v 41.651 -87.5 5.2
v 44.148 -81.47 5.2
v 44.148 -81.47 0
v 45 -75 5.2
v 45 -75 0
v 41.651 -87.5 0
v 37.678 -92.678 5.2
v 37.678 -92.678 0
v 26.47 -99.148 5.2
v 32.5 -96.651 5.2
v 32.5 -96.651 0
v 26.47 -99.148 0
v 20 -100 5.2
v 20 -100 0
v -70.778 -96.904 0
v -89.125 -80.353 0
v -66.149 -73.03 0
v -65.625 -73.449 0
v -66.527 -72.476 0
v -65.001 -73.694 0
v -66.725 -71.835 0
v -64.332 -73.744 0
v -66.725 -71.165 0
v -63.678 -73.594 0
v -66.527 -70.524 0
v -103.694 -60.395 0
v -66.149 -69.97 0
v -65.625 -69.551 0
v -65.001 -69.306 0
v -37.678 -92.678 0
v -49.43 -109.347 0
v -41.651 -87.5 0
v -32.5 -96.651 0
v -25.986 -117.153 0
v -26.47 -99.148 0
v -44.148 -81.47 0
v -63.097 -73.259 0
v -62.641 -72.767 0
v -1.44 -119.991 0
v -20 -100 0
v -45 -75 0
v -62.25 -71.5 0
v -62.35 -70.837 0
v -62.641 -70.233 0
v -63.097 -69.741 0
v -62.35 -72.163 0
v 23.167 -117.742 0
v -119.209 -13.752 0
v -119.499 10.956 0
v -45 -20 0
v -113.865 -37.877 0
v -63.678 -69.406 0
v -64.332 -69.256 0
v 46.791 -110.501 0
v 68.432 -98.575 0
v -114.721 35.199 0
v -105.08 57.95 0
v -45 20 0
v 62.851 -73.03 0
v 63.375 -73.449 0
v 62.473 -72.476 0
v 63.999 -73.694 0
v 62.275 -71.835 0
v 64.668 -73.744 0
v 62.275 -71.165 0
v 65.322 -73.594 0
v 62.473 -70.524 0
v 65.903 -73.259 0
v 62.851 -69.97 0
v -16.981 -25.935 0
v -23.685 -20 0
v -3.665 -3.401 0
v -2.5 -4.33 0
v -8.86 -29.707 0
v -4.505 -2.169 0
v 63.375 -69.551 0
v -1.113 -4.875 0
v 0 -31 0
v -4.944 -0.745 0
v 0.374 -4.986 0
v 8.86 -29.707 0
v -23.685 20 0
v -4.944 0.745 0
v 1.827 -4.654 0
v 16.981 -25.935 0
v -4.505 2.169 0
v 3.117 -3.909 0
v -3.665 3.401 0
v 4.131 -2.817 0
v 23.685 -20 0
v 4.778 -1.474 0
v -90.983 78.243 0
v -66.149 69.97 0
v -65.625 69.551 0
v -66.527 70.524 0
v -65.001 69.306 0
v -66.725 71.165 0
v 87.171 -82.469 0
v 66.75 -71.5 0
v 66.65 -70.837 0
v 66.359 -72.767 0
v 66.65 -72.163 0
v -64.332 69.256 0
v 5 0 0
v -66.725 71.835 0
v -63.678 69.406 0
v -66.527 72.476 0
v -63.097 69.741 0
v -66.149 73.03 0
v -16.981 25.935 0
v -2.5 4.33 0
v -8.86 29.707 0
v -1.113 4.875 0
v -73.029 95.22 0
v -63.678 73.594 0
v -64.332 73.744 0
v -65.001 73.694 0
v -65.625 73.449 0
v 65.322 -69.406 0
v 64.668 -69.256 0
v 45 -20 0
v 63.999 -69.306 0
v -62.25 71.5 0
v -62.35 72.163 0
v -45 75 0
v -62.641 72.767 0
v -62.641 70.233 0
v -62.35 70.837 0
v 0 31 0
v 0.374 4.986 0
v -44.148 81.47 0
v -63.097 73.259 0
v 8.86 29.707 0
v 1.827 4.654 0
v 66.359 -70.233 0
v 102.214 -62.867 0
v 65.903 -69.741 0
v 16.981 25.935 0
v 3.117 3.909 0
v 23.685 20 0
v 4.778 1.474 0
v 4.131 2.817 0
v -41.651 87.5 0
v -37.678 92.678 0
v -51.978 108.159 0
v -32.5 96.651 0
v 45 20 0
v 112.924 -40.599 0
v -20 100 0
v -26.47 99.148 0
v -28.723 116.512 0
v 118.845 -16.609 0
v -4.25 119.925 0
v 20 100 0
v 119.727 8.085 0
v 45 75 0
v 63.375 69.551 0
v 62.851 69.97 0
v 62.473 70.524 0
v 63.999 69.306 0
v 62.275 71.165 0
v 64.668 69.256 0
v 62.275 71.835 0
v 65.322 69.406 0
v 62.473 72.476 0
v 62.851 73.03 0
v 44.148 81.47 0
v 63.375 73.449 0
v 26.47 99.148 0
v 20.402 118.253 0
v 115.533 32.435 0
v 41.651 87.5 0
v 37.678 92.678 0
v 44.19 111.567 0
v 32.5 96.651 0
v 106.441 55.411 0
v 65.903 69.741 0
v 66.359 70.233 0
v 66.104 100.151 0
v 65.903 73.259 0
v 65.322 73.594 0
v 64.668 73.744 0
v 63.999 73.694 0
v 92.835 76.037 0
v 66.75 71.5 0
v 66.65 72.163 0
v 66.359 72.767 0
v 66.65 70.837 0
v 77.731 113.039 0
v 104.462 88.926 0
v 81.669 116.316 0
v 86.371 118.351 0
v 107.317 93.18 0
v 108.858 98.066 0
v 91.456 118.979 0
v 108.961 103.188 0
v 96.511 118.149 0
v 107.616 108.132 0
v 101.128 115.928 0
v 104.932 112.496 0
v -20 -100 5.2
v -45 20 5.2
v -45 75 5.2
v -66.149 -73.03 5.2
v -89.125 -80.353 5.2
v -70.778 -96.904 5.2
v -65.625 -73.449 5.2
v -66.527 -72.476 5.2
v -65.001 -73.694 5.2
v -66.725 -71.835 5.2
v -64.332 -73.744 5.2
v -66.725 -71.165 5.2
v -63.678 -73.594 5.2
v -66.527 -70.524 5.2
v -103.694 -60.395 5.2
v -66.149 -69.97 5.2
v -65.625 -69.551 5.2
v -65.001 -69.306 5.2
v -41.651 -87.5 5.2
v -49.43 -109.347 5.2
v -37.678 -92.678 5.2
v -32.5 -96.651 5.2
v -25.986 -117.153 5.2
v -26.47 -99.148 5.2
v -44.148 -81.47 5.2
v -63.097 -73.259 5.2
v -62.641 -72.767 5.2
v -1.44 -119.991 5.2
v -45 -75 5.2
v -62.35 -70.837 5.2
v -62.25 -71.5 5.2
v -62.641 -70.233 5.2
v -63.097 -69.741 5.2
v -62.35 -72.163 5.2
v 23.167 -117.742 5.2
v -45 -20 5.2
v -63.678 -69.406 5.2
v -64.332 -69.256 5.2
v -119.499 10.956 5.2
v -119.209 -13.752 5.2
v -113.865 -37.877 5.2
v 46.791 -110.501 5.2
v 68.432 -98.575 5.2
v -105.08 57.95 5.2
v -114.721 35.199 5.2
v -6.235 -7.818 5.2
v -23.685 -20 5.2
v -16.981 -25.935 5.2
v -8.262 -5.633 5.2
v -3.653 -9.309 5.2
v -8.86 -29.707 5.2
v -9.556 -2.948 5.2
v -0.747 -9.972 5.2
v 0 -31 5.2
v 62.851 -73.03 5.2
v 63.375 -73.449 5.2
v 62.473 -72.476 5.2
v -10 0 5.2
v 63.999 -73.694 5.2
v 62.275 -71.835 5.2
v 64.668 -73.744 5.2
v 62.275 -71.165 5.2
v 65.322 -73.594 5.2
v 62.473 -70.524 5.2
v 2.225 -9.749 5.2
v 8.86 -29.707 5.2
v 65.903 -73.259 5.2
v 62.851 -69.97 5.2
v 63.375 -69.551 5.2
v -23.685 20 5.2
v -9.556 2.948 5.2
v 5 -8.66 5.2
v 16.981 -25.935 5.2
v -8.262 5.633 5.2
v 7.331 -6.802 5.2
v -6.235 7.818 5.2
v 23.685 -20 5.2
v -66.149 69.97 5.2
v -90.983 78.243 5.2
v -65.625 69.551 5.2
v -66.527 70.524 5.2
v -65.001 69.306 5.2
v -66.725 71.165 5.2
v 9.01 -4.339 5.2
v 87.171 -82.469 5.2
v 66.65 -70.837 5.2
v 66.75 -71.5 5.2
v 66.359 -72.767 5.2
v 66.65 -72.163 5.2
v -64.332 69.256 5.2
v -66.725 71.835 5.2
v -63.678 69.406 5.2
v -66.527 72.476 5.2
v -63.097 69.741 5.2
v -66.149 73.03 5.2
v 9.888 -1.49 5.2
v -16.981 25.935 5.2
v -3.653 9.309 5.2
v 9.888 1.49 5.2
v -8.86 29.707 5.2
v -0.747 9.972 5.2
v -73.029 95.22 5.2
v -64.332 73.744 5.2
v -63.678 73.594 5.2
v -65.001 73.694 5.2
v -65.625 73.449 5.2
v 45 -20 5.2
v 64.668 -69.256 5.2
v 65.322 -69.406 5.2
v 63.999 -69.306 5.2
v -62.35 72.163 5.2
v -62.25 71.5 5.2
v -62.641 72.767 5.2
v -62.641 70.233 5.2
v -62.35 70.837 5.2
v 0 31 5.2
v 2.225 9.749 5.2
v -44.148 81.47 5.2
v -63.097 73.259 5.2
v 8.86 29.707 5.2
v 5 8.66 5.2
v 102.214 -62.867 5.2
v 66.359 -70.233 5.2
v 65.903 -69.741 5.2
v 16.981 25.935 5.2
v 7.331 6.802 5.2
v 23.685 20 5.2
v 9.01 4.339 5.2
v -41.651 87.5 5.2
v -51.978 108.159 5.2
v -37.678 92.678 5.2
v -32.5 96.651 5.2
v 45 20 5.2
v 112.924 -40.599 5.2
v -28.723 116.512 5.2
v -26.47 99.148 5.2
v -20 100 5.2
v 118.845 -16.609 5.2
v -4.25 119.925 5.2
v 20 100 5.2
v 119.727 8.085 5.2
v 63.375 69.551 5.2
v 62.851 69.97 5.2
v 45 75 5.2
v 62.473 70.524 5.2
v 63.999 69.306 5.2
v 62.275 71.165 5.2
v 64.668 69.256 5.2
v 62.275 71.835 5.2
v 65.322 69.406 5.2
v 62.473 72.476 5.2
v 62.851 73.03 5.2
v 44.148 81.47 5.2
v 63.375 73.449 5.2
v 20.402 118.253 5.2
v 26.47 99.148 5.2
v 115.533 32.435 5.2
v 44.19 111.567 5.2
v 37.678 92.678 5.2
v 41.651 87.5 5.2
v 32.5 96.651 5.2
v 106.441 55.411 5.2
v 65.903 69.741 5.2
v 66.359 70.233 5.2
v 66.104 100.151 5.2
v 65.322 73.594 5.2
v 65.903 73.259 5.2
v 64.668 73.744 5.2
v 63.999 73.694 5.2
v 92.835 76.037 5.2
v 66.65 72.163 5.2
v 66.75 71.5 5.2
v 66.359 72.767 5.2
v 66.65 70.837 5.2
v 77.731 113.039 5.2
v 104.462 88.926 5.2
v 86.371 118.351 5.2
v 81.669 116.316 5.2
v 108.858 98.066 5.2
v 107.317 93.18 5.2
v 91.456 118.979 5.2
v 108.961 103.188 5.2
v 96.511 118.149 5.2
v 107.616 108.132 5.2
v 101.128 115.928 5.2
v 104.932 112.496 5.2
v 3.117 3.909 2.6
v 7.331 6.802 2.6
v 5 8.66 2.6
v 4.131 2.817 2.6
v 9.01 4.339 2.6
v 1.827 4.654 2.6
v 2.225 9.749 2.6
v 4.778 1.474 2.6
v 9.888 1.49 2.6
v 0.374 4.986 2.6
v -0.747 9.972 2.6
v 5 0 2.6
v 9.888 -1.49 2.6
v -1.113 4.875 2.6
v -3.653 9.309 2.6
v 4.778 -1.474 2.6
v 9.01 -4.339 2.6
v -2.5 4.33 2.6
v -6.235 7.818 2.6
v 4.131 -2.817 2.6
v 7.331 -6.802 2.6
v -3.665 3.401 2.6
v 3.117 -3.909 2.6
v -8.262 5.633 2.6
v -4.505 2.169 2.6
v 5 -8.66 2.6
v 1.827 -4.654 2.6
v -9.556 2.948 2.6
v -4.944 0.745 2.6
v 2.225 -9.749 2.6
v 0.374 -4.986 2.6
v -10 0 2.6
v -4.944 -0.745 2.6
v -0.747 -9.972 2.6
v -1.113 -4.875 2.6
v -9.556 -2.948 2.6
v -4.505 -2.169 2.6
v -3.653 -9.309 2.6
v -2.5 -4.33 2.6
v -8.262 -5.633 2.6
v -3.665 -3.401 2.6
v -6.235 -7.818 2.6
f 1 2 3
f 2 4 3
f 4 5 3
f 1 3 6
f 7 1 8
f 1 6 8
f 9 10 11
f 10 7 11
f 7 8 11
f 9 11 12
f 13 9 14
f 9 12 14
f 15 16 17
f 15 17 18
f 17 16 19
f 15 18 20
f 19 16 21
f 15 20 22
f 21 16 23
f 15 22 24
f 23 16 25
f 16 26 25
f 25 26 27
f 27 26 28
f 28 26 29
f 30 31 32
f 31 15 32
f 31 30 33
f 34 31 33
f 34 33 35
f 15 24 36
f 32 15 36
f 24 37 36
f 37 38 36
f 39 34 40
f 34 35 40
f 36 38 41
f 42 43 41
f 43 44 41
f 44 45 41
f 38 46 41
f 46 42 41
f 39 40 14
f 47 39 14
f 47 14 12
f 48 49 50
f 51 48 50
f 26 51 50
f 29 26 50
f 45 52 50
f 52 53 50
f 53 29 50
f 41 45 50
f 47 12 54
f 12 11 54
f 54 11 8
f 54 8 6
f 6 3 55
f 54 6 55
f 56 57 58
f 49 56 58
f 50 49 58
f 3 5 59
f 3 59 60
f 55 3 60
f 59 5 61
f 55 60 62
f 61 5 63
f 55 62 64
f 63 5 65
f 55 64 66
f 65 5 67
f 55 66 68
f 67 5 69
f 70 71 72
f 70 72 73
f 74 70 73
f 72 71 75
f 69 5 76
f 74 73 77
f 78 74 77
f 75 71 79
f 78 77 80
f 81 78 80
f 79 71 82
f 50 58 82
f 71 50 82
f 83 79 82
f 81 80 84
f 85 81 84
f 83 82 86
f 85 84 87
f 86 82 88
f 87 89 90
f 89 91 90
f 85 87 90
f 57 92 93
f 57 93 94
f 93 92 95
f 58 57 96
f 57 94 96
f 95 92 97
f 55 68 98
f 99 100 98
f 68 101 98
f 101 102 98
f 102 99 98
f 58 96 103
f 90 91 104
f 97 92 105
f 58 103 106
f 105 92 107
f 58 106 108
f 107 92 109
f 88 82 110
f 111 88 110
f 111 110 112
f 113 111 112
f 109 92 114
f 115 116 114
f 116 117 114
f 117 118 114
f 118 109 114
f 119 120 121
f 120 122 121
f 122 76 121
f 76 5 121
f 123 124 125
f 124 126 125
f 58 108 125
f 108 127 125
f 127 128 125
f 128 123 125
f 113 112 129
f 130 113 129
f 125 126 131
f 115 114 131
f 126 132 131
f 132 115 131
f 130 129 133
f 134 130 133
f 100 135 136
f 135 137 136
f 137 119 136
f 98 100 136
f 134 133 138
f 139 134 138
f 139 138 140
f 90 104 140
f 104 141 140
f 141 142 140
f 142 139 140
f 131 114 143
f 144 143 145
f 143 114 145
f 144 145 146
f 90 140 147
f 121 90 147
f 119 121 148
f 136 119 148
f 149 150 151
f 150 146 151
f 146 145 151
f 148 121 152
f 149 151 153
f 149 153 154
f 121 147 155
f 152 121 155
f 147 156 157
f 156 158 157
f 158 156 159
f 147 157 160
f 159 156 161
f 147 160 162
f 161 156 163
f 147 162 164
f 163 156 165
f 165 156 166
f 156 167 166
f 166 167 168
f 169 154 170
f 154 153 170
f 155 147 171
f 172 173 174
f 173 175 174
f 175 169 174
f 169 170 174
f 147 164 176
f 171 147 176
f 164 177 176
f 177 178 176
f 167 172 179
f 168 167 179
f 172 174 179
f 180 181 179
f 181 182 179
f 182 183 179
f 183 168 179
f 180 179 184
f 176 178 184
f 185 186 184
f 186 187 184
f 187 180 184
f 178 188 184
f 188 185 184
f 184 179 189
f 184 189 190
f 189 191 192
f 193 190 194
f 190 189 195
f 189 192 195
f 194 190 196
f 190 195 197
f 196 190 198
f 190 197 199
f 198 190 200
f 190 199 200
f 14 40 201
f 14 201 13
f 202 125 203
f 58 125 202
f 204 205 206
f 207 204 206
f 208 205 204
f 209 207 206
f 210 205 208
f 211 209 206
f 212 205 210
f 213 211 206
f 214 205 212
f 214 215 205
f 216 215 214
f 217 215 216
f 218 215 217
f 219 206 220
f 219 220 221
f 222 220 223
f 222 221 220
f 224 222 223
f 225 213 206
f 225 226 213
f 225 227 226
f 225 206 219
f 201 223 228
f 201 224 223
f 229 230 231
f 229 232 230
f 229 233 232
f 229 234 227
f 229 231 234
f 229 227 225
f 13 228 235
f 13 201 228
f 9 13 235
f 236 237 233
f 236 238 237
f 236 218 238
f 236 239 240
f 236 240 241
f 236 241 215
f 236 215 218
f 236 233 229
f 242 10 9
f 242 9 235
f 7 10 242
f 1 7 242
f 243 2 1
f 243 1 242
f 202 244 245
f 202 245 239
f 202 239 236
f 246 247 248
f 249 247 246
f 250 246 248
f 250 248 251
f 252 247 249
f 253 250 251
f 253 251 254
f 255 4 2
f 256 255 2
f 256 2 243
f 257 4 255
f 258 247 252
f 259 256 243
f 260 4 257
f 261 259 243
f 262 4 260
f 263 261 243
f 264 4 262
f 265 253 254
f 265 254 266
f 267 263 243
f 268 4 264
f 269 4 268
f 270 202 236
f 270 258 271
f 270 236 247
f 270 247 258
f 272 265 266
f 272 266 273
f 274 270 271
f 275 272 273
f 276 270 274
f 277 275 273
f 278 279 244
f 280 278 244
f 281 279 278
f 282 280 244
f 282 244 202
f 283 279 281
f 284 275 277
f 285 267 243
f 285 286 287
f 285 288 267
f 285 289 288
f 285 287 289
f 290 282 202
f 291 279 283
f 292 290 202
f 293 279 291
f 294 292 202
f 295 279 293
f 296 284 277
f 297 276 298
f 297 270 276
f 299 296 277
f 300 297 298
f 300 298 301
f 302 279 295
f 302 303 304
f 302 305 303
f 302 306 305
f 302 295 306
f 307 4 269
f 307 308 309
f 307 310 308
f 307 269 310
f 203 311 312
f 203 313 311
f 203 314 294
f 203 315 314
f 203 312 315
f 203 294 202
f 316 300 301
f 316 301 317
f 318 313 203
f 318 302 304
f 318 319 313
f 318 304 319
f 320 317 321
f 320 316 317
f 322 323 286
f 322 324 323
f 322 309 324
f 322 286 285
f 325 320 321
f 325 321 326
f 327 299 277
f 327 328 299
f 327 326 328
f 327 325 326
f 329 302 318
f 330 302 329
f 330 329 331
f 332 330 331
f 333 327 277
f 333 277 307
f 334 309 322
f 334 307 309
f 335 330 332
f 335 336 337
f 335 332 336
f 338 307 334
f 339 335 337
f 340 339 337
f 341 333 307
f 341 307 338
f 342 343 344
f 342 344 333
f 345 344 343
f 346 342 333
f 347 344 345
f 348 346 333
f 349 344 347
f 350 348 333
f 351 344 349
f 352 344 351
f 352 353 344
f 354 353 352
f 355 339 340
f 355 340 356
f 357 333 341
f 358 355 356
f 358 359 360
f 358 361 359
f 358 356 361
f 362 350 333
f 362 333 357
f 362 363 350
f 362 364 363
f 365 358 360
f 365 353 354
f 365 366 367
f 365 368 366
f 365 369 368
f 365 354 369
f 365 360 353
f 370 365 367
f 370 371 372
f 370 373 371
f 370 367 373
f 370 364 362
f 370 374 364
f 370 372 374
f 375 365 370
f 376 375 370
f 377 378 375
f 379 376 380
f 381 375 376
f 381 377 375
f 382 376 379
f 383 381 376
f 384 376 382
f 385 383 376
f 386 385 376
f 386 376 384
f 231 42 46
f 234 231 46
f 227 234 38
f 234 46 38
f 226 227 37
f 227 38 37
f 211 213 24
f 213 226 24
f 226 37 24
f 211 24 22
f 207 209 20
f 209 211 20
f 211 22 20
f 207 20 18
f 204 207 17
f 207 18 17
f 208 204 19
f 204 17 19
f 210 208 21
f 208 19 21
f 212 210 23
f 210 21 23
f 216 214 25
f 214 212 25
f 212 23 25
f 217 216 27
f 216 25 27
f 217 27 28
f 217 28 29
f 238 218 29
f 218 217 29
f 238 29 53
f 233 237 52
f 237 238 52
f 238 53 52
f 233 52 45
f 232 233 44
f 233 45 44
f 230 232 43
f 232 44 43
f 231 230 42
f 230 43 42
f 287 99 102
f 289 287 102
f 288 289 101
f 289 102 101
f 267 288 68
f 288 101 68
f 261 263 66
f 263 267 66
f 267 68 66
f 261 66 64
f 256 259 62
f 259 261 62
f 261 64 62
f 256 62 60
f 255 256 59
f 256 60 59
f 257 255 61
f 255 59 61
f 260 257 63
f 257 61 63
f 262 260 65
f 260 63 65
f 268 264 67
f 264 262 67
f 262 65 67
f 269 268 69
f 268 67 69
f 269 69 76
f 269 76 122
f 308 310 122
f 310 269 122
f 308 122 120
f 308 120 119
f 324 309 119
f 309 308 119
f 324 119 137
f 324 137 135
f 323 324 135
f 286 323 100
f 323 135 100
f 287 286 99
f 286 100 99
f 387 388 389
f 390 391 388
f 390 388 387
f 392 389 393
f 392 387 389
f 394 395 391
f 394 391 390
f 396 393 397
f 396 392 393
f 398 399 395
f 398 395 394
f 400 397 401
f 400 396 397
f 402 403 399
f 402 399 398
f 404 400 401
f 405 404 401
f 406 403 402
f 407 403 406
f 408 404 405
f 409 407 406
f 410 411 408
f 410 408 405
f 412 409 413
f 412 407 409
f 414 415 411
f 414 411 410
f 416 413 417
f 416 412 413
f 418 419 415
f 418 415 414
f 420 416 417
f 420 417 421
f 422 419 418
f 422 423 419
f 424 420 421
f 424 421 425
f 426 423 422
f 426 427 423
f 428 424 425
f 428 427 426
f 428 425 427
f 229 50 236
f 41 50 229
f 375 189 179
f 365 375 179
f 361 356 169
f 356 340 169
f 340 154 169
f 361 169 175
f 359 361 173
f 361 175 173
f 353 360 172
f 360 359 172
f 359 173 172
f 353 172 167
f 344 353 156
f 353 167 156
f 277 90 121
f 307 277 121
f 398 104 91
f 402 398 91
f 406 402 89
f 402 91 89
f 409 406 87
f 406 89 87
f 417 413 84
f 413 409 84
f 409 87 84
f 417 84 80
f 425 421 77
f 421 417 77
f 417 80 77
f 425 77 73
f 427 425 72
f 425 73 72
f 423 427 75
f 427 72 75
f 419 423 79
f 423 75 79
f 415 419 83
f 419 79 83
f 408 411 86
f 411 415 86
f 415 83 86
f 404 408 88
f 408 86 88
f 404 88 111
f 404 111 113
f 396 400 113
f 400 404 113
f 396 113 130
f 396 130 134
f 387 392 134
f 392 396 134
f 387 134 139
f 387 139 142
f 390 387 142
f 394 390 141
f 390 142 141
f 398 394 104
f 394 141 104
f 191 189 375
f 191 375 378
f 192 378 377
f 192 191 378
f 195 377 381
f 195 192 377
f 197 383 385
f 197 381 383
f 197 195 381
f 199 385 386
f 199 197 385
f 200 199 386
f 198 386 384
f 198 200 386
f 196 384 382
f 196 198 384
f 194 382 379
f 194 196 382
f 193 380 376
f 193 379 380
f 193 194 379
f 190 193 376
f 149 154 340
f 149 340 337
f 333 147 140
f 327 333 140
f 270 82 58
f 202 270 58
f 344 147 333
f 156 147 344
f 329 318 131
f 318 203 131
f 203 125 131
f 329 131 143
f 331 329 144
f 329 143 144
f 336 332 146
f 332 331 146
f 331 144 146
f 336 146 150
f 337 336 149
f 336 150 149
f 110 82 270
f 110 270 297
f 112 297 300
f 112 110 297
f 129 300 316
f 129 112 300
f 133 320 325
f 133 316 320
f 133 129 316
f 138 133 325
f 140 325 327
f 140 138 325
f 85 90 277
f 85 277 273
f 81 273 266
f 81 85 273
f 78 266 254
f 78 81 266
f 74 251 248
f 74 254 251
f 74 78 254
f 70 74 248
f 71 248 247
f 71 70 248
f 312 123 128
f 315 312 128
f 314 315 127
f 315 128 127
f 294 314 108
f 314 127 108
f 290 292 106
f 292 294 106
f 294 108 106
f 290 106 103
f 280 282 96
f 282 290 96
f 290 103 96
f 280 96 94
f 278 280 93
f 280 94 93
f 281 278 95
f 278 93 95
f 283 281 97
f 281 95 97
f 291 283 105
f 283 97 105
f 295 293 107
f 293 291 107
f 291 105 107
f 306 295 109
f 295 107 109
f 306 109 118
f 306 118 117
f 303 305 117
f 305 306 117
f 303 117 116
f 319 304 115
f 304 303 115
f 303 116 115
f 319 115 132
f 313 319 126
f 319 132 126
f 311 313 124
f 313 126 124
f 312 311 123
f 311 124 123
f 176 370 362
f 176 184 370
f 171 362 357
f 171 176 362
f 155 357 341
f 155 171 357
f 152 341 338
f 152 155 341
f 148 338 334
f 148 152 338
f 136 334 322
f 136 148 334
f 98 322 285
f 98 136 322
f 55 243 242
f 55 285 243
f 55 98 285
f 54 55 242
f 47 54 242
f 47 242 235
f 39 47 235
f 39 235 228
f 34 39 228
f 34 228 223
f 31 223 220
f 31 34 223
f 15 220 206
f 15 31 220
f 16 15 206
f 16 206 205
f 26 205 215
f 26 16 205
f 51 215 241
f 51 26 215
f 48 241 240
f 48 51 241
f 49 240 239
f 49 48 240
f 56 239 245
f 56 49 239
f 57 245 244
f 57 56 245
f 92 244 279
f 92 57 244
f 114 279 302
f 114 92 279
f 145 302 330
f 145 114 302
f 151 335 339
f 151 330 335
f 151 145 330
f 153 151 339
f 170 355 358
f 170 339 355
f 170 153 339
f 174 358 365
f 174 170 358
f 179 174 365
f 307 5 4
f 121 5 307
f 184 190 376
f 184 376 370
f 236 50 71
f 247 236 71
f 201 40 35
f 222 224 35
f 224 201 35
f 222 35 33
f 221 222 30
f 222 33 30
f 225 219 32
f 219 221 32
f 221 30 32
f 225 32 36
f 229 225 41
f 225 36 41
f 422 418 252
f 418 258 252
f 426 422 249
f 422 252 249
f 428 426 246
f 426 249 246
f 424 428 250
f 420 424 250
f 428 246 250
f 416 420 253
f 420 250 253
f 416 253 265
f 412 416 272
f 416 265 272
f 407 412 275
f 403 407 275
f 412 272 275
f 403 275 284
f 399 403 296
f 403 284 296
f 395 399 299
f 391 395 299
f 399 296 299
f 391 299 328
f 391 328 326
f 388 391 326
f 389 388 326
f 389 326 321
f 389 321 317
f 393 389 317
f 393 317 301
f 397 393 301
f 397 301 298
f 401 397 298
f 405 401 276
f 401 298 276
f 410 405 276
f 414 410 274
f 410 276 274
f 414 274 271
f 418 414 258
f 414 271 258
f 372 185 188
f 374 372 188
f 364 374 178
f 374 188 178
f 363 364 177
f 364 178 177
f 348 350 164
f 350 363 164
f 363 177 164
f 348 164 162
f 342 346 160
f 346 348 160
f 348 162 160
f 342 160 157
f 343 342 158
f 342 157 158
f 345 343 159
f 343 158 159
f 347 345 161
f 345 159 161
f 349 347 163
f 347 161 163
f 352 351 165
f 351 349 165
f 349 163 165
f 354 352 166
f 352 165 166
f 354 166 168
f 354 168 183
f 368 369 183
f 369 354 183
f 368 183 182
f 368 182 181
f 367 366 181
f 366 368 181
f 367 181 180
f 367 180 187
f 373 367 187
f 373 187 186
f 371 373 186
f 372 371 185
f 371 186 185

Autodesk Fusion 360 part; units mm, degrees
sketch "Sketch1" plane through (0, 0, 0) normal (0, 0, 1) x (1, 0, 0)
  circle A0 centre (-64.5, 71.5) radius 2.25
  circle A1 centre (64.5, 71.5) radius 2.25
  circle A2 centre (-64.5, -71.5) radius 2.25
  circle A3 centre (64.5, -71.5) radius 2.25
  line L0 (20, 100) -> (-20, 100)
  line L1 (-20, -100) -> (20, -100)
  arc A4 (-20, 100) -> (-45, 75) centre (-20, 75) ccw
  arc A5 (45, 75) -> (20, 100) centre (20, 75) ccw
  arc A6 (20, -100) -> (45, -75) centre (20, -75) ccw
  arc A7 (-45, -75) -> (-20, -100) centre (-20, -75) ccw
  line L2 (45, 20) -> (-45, -20) construction
  circle A8 centre (0, 0) radius 5
  line L3 (64.5, 71.5) -> (-64.5, 71.5) construction
  line L4 (-64.5, 71.5) -> (-64.5, -71.5) construction
  line L5 (-64.5, -71.5) -> (64.5, -71.5) construction
  line L6 (64.5, -71.5) -> (64.5, 71.5) construction
  line L7 (64.5, 71.5) -> (-64.5, -71.5) construction
  line L8 (-64.5, 71.5) -> (64.5, -71.5) construction
  line L9 (45, 20) -> (23.6854, 20)
  line L10 (-23.6854, 20) -> (-45, 20)
  line L11 (-45, 75) -> (-45, 20)
  line L12 (-45, -20) -> (-45, -75)
  arc A9 (-23.6854, -20) -> (23.6854, -20) centre (0, 0) ccw
  arc A10 (23.6854, 20) -> (-23.6854, 20) centre (0, 0) ccw
  line L13 (45, -75) -> (45, -20)
  line L14 (45, 20) -> (45, 75)
  line L15 (-45, 20) -> (4.5691, -2.0307) construction
  line L16 (28.3282, -12.5903) -> (45, -20) construction
  line L17 (-45, -20) -> (-23.6854, -20)
  line L18 (23.6854, -20) -> (45, -20)
  line L19 (91.0962, 100.9826) -> (104.4615, 88.9257) construction
  line L20 (91.0962, 100.9826) -> (77.7308, 113.0394) construction
  line L21 (104.4615, 88.9257) -> (92.8349, 76.0373)
  line L22 (77.7308, 113.0394) -> (66.1042, 100.151)
  arc A11 (104.4615, 88.9257) -> (77.7308, 113.0394) centre (91.0962, 100.9826) ccw
  arc A12 (66.1042, 100.151) -> (92.8349, 76.0373) centre (0, 0) ccw
  dimension "d14" = 4.5
  dimension "d15" = 4.5
  dimension "d16" = 4.5
  dimension "d17" = 4.5
  dimension "d20" = 240
  dimension "d21" = 25
  dimension "d23" = 40
  dimension "d24" = 10
  dimension "d25" = 62
  dimension "d26" = 129
  dimension "d27" = 143
  dimension "d29" = 36
  dimension "d33" = 45
  dimension "d34" = 100
  dimension "d35" = 100
  dimension "d36" = 149.4615
  dimension "d37" = 132.054
  dimension "d38" = 213.0394
  dimension "d39" = 18.2443
  dimension "d40" = 18
extrude "Extrude1" add sketch "Sketch1" along normal blind 5.2
sketch "Sketch4" plane through (0, 0, 5.2) normal (0, 0, 1) x (-1, 0, 0)
  circle A0 centre (-64.5, 71.5) radius 2.25
  circle A1 centre (64.5, 71.5) radius 2.25
  line L0 (-45, -20) -> (-23.6854, -20)
  arc A2 (-23.6854, -20) -> (23.6854, -20) centre (0, 0) ccw
  line L1 (23.6854, -20) -> (45, -20)
  line L2 (45, -20) -> (45, -75)
  arc A3 (20, -100) -> (45, -75) centre (20, -75) ccw
  line L3 (20, -100) -> (-20, -100)
  arc A4 (-45, -75) -> (-20, -100) centre (-20, -75) ccw
  line L4 (-45, -75) -> (-45, -20)
  circle A5 centre (64.5, -71.5) radius 2.25
  circle A6 centre (0, 0) radius 5
  line L5 (45, 75) -> (45, 20)
  line L6 (45, 20) -> (23.6854, 20)
  arc A7 (23.6854, 20) -> (-23.6854, 20) centre (0, 0) ccw
  line L7 (-23.6854, 20) -> (-45, 20)
  line L8 (-45, 20) -> (-45, 75)
  arc A8 (-20, 100) -> (-45, 75) centre (-20, 75) ccw
  line L9 (-20, 100) -> (20, 100)
  arc A9 (45, 75) -> (20, 100) centre (20, 75) ccw
  circle A10 centre (-64.5, -71.5) radius 2.25
  arc A11 (-104.4615, -88.9257) -> (-77.7308, -113.0394) centre (-91.0962, -100.9826) ccw
  line L10 (-77.7308, -113.0394) -> (-66.1042, -100.151)
  arc A12 (-66.1042, -100.151) -> (-92.8349, -76.0373) centre (0, 0) ccw
  line L11 (-92.8349, -76.0373) -> (-104.4615, -88.9257)
  circle A13 centre (0, 0) radius 10
  dimension "d30" = 20
extrude "Extrude3" cut sketch "Sketch4" against normal blind 2.6 contours A13
equation "d31 = ( -5.2 / 2 ) * 1 mm"
